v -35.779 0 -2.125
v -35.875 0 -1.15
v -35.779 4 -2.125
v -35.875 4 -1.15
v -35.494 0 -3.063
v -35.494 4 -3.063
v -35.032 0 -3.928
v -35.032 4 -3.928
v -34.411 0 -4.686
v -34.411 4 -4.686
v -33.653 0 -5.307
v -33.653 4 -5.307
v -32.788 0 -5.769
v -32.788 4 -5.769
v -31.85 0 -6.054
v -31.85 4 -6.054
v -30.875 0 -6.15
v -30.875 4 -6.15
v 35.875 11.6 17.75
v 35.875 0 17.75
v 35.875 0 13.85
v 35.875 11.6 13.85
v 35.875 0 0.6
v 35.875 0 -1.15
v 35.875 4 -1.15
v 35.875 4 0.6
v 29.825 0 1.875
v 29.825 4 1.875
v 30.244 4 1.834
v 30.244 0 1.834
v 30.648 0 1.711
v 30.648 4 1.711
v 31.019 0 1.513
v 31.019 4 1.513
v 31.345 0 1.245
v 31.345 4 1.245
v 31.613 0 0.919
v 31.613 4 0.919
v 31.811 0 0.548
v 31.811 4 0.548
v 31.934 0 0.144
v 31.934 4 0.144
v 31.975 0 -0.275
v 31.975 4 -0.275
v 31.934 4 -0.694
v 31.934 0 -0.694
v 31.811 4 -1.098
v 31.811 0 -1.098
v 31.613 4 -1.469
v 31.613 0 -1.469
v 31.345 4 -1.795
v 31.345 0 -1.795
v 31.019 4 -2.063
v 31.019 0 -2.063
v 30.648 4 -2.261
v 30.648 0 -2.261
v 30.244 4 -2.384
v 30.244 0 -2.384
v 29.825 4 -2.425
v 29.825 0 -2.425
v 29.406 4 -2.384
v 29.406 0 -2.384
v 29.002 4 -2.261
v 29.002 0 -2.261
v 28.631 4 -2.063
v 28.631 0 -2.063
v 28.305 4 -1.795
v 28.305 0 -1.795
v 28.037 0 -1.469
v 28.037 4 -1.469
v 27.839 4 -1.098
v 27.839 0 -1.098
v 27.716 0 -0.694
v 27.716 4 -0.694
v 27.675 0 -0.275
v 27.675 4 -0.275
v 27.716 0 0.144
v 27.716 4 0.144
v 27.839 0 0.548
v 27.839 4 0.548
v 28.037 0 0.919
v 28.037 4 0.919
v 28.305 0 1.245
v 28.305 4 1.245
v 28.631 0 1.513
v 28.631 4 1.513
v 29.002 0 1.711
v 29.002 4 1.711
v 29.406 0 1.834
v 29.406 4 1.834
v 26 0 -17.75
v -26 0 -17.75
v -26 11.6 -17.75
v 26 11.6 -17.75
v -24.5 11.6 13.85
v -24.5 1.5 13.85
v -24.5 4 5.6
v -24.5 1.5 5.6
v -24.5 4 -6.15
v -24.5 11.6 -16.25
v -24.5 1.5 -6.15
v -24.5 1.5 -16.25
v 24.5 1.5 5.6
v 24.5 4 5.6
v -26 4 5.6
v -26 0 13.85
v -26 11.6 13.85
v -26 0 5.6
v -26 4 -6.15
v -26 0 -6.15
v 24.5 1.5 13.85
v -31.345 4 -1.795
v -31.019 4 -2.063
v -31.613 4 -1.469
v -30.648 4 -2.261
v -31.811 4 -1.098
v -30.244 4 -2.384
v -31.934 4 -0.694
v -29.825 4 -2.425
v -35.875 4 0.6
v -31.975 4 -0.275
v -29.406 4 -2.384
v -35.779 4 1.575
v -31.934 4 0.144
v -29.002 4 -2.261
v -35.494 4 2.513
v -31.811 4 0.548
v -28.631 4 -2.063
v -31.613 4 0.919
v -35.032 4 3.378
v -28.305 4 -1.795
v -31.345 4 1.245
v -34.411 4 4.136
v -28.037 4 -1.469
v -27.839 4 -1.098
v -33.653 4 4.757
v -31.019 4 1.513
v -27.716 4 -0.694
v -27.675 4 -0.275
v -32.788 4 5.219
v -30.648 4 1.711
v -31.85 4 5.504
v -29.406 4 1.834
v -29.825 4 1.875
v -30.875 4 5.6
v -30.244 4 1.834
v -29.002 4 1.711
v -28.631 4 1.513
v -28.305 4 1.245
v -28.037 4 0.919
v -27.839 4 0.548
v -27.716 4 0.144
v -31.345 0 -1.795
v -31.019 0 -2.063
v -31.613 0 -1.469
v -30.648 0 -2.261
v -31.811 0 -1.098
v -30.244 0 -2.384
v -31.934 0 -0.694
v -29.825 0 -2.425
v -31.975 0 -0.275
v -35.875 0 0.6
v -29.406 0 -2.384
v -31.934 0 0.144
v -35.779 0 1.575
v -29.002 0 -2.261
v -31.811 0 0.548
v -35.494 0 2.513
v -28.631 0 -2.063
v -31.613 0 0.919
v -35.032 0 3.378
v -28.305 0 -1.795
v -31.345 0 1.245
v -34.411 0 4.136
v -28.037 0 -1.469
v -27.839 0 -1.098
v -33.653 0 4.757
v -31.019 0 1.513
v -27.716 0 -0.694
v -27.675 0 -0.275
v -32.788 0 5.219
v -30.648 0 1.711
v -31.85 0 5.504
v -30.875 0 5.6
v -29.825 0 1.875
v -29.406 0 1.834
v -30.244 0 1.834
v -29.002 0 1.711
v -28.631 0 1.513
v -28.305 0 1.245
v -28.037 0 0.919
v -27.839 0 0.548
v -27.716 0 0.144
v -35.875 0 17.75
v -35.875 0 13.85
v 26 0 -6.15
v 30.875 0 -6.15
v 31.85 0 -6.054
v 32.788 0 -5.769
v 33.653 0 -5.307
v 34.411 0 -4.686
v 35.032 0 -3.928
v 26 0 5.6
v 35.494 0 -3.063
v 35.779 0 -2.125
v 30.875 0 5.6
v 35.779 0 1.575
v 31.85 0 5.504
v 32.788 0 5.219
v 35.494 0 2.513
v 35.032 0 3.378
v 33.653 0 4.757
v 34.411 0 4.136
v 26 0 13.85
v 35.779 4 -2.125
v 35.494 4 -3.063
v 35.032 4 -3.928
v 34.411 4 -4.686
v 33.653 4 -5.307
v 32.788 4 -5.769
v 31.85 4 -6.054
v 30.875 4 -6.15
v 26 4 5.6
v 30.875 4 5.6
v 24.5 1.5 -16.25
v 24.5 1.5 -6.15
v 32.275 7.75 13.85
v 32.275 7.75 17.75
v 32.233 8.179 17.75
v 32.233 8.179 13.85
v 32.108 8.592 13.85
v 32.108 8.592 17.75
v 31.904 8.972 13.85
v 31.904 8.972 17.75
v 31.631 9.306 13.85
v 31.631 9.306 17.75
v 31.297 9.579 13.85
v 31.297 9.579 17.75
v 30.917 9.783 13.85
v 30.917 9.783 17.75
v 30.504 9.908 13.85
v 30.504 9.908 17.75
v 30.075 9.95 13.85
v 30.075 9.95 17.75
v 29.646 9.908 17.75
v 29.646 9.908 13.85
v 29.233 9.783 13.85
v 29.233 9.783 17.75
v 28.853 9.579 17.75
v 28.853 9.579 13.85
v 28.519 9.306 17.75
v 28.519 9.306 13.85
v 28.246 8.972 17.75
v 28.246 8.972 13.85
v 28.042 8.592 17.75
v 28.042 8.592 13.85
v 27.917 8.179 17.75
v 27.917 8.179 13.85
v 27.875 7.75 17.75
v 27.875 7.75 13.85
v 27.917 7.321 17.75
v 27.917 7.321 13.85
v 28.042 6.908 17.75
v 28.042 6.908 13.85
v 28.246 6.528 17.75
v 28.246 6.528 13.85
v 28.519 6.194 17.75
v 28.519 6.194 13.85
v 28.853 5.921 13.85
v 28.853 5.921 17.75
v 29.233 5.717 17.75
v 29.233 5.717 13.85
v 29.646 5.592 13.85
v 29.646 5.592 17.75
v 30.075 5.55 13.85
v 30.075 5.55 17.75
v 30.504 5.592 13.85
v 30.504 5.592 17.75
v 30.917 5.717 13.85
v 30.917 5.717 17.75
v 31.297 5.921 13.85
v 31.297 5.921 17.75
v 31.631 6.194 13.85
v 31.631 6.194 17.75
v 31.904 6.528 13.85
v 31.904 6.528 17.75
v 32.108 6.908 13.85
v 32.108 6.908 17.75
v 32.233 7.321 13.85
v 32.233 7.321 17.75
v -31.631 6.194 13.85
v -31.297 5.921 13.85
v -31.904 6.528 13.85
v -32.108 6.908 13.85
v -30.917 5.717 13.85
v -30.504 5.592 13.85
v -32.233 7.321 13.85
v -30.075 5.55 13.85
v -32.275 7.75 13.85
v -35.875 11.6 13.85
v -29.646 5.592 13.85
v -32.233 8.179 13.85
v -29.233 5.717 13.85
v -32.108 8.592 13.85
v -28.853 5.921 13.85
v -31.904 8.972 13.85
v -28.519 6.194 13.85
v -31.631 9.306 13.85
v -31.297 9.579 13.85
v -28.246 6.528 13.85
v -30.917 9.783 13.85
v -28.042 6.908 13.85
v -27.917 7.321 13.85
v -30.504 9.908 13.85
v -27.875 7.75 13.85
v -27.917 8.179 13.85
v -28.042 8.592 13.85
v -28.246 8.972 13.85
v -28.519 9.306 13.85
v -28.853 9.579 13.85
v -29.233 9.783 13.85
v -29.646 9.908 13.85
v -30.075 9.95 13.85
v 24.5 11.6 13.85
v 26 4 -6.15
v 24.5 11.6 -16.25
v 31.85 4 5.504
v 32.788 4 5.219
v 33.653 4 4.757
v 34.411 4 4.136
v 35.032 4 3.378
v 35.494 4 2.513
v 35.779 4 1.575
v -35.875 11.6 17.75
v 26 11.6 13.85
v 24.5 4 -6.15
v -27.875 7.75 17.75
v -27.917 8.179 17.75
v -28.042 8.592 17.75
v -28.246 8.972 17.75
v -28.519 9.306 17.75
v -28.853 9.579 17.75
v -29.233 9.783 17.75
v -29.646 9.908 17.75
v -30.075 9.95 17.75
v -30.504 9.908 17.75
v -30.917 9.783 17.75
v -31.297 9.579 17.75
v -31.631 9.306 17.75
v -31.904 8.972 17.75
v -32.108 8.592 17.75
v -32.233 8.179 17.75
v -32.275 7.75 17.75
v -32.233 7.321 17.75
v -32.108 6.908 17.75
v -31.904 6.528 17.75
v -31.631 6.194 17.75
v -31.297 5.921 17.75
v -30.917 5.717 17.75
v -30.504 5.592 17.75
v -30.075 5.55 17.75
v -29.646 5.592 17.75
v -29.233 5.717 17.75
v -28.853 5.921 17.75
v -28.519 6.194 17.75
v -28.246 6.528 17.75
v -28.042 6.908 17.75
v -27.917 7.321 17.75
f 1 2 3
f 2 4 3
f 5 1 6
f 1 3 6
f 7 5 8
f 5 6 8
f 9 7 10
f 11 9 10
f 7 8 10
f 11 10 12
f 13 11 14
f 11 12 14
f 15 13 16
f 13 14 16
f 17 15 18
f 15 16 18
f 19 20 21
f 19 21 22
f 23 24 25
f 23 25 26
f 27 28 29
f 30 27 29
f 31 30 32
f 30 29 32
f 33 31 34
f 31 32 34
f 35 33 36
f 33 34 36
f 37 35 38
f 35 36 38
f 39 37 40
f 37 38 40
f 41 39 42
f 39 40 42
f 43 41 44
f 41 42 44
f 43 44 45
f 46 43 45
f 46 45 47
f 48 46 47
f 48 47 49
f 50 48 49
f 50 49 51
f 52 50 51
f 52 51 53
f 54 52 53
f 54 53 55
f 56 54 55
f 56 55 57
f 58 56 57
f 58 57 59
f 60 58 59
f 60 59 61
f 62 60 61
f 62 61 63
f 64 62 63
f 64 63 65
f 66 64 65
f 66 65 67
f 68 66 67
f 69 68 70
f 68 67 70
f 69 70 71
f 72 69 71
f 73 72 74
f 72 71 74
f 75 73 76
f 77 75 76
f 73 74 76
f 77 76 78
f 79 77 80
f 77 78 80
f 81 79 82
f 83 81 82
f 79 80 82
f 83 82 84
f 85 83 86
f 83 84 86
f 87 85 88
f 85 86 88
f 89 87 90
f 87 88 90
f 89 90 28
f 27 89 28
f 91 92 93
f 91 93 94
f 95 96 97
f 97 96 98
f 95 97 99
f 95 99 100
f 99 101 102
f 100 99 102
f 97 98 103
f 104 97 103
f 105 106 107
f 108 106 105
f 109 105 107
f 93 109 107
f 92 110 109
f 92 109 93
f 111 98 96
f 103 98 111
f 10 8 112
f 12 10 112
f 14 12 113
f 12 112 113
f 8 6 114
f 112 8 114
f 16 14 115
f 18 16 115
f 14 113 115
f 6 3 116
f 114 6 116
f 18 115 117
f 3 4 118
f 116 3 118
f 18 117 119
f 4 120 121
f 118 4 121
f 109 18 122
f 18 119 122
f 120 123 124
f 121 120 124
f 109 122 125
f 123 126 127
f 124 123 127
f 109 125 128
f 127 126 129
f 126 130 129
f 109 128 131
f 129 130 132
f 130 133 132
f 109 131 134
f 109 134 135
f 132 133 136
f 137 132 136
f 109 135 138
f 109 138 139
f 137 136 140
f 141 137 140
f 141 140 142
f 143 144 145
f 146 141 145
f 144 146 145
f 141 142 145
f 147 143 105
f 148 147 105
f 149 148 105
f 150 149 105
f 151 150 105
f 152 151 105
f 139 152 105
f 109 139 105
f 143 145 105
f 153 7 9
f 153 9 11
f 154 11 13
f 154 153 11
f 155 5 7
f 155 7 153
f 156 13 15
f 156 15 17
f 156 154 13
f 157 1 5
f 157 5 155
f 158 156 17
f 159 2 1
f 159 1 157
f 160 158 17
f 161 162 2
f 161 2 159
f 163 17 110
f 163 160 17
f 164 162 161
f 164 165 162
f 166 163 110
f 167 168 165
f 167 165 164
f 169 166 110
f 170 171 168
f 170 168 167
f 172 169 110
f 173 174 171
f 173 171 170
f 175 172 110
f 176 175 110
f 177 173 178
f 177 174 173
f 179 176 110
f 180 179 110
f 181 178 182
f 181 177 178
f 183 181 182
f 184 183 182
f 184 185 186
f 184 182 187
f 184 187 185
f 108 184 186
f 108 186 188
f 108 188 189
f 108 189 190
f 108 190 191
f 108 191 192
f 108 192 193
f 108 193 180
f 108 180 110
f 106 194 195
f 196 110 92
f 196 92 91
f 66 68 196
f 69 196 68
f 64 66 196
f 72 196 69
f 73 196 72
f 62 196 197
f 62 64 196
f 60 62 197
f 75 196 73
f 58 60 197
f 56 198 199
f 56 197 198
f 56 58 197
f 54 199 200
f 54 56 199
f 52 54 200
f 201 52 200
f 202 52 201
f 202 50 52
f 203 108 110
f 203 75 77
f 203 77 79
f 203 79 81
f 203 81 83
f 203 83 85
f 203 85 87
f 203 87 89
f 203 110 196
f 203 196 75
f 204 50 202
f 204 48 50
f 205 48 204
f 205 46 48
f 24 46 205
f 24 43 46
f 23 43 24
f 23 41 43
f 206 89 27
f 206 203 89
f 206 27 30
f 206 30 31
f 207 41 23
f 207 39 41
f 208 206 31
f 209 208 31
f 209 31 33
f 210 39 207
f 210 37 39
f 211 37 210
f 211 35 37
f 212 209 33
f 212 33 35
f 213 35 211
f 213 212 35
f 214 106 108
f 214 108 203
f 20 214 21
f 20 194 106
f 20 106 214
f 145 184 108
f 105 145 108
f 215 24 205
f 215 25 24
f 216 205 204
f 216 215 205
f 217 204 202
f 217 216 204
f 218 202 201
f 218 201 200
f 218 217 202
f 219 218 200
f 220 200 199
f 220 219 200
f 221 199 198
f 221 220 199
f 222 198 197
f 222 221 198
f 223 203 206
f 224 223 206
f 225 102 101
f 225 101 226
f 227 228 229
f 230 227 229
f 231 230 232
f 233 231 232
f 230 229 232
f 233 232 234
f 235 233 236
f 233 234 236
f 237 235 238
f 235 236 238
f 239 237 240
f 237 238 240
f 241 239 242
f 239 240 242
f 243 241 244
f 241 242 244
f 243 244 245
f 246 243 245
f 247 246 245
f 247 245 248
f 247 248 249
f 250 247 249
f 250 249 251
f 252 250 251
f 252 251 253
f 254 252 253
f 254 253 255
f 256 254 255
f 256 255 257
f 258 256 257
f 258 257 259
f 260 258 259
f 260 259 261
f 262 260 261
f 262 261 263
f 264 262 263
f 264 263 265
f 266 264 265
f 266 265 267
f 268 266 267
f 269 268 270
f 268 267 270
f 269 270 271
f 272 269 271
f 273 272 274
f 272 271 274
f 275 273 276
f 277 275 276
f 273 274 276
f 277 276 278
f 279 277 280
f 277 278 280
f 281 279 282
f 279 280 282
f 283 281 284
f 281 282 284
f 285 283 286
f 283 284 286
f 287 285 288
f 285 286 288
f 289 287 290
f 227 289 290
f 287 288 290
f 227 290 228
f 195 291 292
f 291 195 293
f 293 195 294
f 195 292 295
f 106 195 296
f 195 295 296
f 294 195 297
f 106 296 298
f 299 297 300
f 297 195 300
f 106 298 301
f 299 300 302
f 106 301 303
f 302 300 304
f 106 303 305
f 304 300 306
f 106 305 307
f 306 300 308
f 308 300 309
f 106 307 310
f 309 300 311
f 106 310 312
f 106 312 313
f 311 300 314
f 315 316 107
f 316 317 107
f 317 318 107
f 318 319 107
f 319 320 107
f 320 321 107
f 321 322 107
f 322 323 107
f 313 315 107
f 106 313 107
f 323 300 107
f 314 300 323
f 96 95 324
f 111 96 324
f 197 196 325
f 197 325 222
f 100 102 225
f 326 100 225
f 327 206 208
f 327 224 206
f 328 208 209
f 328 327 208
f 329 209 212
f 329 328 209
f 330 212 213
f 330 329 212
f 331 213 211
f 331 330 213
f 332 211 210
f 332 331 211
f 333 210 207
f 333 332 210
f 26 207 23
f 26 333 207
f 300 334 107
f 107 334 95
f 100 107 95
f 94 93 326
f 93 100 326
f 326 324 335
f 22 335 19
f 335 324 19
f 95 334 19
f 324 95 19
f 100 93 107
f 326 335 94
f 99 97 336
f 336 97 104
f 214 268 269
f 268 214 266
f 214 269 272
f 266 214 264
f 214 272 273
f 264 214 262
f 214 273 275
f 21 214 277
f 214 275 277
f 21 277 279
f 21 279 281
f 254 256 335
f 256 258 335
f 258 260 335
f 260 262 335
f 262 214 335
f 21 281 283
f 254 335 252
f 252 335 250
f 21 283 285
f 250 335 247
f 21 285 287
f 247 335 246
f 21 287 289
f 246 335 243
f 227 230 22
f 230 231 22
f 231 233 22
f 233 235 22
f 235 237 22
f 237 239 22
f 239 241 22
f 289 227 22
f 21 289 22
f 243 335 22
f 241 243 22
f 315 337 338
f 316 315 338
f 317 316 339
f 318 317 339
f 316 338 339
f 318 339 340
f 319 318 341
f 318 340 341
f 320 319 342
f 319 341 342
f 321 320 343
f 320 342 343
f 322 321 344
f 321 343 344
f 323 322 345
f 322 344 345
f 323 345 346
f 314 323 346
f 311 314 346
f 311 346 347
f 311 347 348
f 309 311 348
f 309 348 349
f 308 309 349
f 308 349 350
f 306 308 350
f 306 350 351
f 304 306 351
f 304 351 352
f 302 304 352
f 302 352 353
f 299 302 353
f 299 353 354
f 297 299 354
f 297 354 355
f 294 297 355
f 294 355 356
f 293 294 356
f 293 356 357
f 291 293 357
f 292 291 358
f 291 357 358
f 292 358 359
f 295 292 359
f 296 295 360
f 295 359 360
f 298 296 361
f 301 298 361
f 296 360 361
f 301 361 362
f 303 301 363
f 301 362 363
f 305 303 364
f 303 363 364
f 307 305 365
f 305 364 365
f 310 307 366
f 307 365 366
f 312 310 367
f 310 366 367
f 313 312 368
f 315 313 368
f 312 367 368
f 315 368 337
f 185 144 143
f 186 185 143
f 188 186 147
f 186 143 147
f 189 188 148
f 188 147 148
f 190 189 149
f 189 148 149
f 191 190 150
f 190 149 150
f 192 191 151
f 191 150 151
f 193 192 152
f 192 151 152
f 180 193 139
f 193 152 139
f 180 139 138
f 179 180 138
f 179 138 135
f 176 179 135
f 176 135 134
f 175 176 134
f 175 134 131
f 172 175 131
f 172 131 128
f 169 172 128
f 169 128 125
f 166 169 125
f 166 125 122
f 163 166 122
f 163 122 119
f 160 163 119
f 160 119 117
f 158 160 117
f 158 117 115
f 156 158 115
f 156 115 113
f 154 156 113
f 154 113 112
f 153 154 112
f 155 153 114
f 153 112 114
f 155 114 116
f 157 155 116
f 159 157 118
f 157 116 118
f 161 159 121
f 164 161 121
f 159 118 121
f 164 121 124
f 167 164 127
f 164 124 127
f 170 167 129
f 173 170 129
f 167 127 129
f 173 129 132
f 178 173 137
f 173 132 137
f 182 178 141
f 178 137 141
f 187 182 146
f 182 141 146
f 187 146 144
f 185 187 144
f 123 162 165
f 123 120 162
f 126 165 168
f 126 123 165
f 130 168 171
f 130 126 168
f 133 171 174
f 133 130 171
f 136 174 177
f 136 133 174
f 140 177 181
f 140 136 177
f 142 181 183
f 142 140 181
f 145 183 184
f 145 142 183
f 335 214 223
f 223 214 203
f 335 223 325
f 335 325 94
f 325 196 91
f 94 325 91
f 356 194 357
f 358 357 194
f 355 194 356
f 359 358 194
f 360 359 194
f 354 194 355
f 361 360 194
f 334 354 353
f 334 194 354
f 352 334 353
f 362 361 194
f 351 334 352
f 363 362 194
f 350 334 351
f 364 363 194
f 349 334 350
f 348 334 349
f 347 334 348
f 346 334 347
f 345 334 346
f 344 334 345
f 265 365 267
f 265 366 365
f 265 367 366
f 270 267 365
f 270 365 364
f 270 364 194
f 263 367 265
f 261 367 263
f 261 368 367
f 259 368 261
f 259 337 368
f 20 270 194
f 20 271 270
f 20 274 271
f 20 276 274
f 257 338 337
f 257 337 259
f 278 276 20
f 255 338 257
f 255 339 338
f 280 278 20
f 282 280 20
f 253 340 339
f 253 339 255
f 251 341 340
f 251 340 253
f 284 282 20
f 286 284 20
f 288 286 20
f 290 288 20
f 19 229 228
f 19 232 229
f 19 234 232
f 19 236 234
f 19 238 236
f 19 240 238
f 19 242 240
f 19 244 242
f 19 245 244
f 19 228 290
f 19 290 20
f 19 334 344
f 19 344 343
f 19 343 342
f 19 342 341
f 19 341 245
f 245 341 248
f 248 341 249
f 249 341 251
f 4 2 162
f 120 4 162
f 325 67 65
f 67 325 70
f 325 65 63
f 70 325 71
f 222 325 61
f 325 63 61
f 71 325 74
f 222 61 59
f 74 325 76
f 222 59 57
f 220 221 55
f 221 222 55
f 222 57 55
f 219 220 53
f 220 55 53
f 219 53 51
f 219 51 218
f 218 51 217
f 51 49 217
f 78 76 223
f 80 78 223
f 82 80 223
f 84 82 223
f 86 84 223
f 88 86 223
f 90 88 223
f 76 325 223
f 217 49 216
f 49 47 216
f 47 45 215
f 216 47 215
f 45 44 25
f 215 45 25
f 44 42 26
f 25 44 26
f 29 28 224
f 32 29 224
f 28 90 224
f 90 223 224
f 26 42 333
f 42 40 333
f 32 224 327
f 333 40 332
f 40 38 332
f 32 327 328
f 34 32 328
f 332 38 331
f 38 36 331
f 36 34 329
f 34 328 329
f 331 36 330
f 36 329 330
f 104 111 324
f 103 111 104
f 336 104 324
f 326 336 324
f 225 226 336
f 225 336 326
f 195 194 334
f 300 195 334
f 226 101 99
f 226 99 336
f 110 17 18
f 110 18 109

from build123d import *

# Parameters (mm, degrees)
SKETCH1_W           = 52
SKETCH1_H           = 35.5
BOSS_EXTRUDE1_DEPTH = 11.6
SHELL1_T            = -1.5
SKETCH2_W           = 71.75
SKETCH2_H           = 11.6
BOSS_EXTRUDE2_DEPTH = 3.9
SKETCH3_W           = 71.75
SKETCH3_H           = 11.75
BOSS_EXTRUDE3_DEPTH = 4
FILLET1_R           = 5
SKETCH4_R           = 2.15
CUT_EXTRUDE1_DEPTH  = 41.741110994
SKETCH5_R           = 2.2
CUT_EXTRUDE2_DEPTH  = 52.786345932


with BuildPart() as part:
    # Sketch1 → Boss-Extrude1 (new body)
    with BuildSketch(Plane(origin=(0, 0, 0), x_dir=(1, 0, 0), z_dir=(0, 1, 0))):
        Rectangle(SKETCH1_W, SKETCH1_H)
    extrude(amount=BOSS_EXTRUDE1_DEPTH)

    # Shell1
    shell1_openings = [part.faces().sort_by_distance(p)[0] for p in [
        (0, 11.6, 0),
    ]]
    offset(amount=SHELL1_T, openings=shell1_openings, kind=Kind.INTERSECTION)

    # Sketch2 → Boss-Extrude2 (add)
    with BuildSketch(Plane.XY.offset(17.75)):
        with Locations((0, 5.8)):
            Rectangle(SKETCH2_W, SKETCH2_H)
    extrude(amount=-BOSS_EXTRUDE2_DEPTH)

    # Sketch3 → Boss-Extrude3 (add)
    with BuildSketch(Plane.XZ):
        with Locations((0, -0.275)):
            Rectangle(SKETCH3_W, SKETCH3_H)
    extrude(amount=-BOSS_EXTRUDE3_DEPTH)

    # Fillet1
    fillet1_edges = [part.edges().sort_by_distance(p)[0] for p in [
        (-35.875, 2, 5.6),
        (35.875, 2, -6.15),
        (-35.875, 2, -6.15),
        (35.875, 2, 5.6),
    ]]
    fillet(fillet1_edges, radius=FILLET1_R)

    # Sketch4 → Cut-Extrude1 (cut, through all)
    with BuildSketch(Plane(origin=(0, 4, 0), x_dir=(1, 0, 0), z_dir=(0, 1, 0))):
        with Locations(Location((-29.825, 0.275, 0), (0, 0, 270))):
            Circle(SKETCH4_R)
        with Locations(Location((29.825, 0.275, 0), (0, 0, 270))):
            Circle(SKETCH4_R)
    extrude(amount=-CUT_EXTRUDE1_DEPTH, mode=Mode.SUBTRACT)

    # Sketch5 → Cut-Extrude2 (cut, through all)
    with BuildSketch(Plane.XY.offset(17.75)):
        with Locations((-30.075, 7.75)):
            Circle(SKETCH5_R)
        with Locations((30.075, 7.75)):
            Circle(SKETCH5_R)
    extrude(amount=-CUT_EXTRUDE2_DEPTH, mode=Mode.SUBTRACT)


solid = part.part
